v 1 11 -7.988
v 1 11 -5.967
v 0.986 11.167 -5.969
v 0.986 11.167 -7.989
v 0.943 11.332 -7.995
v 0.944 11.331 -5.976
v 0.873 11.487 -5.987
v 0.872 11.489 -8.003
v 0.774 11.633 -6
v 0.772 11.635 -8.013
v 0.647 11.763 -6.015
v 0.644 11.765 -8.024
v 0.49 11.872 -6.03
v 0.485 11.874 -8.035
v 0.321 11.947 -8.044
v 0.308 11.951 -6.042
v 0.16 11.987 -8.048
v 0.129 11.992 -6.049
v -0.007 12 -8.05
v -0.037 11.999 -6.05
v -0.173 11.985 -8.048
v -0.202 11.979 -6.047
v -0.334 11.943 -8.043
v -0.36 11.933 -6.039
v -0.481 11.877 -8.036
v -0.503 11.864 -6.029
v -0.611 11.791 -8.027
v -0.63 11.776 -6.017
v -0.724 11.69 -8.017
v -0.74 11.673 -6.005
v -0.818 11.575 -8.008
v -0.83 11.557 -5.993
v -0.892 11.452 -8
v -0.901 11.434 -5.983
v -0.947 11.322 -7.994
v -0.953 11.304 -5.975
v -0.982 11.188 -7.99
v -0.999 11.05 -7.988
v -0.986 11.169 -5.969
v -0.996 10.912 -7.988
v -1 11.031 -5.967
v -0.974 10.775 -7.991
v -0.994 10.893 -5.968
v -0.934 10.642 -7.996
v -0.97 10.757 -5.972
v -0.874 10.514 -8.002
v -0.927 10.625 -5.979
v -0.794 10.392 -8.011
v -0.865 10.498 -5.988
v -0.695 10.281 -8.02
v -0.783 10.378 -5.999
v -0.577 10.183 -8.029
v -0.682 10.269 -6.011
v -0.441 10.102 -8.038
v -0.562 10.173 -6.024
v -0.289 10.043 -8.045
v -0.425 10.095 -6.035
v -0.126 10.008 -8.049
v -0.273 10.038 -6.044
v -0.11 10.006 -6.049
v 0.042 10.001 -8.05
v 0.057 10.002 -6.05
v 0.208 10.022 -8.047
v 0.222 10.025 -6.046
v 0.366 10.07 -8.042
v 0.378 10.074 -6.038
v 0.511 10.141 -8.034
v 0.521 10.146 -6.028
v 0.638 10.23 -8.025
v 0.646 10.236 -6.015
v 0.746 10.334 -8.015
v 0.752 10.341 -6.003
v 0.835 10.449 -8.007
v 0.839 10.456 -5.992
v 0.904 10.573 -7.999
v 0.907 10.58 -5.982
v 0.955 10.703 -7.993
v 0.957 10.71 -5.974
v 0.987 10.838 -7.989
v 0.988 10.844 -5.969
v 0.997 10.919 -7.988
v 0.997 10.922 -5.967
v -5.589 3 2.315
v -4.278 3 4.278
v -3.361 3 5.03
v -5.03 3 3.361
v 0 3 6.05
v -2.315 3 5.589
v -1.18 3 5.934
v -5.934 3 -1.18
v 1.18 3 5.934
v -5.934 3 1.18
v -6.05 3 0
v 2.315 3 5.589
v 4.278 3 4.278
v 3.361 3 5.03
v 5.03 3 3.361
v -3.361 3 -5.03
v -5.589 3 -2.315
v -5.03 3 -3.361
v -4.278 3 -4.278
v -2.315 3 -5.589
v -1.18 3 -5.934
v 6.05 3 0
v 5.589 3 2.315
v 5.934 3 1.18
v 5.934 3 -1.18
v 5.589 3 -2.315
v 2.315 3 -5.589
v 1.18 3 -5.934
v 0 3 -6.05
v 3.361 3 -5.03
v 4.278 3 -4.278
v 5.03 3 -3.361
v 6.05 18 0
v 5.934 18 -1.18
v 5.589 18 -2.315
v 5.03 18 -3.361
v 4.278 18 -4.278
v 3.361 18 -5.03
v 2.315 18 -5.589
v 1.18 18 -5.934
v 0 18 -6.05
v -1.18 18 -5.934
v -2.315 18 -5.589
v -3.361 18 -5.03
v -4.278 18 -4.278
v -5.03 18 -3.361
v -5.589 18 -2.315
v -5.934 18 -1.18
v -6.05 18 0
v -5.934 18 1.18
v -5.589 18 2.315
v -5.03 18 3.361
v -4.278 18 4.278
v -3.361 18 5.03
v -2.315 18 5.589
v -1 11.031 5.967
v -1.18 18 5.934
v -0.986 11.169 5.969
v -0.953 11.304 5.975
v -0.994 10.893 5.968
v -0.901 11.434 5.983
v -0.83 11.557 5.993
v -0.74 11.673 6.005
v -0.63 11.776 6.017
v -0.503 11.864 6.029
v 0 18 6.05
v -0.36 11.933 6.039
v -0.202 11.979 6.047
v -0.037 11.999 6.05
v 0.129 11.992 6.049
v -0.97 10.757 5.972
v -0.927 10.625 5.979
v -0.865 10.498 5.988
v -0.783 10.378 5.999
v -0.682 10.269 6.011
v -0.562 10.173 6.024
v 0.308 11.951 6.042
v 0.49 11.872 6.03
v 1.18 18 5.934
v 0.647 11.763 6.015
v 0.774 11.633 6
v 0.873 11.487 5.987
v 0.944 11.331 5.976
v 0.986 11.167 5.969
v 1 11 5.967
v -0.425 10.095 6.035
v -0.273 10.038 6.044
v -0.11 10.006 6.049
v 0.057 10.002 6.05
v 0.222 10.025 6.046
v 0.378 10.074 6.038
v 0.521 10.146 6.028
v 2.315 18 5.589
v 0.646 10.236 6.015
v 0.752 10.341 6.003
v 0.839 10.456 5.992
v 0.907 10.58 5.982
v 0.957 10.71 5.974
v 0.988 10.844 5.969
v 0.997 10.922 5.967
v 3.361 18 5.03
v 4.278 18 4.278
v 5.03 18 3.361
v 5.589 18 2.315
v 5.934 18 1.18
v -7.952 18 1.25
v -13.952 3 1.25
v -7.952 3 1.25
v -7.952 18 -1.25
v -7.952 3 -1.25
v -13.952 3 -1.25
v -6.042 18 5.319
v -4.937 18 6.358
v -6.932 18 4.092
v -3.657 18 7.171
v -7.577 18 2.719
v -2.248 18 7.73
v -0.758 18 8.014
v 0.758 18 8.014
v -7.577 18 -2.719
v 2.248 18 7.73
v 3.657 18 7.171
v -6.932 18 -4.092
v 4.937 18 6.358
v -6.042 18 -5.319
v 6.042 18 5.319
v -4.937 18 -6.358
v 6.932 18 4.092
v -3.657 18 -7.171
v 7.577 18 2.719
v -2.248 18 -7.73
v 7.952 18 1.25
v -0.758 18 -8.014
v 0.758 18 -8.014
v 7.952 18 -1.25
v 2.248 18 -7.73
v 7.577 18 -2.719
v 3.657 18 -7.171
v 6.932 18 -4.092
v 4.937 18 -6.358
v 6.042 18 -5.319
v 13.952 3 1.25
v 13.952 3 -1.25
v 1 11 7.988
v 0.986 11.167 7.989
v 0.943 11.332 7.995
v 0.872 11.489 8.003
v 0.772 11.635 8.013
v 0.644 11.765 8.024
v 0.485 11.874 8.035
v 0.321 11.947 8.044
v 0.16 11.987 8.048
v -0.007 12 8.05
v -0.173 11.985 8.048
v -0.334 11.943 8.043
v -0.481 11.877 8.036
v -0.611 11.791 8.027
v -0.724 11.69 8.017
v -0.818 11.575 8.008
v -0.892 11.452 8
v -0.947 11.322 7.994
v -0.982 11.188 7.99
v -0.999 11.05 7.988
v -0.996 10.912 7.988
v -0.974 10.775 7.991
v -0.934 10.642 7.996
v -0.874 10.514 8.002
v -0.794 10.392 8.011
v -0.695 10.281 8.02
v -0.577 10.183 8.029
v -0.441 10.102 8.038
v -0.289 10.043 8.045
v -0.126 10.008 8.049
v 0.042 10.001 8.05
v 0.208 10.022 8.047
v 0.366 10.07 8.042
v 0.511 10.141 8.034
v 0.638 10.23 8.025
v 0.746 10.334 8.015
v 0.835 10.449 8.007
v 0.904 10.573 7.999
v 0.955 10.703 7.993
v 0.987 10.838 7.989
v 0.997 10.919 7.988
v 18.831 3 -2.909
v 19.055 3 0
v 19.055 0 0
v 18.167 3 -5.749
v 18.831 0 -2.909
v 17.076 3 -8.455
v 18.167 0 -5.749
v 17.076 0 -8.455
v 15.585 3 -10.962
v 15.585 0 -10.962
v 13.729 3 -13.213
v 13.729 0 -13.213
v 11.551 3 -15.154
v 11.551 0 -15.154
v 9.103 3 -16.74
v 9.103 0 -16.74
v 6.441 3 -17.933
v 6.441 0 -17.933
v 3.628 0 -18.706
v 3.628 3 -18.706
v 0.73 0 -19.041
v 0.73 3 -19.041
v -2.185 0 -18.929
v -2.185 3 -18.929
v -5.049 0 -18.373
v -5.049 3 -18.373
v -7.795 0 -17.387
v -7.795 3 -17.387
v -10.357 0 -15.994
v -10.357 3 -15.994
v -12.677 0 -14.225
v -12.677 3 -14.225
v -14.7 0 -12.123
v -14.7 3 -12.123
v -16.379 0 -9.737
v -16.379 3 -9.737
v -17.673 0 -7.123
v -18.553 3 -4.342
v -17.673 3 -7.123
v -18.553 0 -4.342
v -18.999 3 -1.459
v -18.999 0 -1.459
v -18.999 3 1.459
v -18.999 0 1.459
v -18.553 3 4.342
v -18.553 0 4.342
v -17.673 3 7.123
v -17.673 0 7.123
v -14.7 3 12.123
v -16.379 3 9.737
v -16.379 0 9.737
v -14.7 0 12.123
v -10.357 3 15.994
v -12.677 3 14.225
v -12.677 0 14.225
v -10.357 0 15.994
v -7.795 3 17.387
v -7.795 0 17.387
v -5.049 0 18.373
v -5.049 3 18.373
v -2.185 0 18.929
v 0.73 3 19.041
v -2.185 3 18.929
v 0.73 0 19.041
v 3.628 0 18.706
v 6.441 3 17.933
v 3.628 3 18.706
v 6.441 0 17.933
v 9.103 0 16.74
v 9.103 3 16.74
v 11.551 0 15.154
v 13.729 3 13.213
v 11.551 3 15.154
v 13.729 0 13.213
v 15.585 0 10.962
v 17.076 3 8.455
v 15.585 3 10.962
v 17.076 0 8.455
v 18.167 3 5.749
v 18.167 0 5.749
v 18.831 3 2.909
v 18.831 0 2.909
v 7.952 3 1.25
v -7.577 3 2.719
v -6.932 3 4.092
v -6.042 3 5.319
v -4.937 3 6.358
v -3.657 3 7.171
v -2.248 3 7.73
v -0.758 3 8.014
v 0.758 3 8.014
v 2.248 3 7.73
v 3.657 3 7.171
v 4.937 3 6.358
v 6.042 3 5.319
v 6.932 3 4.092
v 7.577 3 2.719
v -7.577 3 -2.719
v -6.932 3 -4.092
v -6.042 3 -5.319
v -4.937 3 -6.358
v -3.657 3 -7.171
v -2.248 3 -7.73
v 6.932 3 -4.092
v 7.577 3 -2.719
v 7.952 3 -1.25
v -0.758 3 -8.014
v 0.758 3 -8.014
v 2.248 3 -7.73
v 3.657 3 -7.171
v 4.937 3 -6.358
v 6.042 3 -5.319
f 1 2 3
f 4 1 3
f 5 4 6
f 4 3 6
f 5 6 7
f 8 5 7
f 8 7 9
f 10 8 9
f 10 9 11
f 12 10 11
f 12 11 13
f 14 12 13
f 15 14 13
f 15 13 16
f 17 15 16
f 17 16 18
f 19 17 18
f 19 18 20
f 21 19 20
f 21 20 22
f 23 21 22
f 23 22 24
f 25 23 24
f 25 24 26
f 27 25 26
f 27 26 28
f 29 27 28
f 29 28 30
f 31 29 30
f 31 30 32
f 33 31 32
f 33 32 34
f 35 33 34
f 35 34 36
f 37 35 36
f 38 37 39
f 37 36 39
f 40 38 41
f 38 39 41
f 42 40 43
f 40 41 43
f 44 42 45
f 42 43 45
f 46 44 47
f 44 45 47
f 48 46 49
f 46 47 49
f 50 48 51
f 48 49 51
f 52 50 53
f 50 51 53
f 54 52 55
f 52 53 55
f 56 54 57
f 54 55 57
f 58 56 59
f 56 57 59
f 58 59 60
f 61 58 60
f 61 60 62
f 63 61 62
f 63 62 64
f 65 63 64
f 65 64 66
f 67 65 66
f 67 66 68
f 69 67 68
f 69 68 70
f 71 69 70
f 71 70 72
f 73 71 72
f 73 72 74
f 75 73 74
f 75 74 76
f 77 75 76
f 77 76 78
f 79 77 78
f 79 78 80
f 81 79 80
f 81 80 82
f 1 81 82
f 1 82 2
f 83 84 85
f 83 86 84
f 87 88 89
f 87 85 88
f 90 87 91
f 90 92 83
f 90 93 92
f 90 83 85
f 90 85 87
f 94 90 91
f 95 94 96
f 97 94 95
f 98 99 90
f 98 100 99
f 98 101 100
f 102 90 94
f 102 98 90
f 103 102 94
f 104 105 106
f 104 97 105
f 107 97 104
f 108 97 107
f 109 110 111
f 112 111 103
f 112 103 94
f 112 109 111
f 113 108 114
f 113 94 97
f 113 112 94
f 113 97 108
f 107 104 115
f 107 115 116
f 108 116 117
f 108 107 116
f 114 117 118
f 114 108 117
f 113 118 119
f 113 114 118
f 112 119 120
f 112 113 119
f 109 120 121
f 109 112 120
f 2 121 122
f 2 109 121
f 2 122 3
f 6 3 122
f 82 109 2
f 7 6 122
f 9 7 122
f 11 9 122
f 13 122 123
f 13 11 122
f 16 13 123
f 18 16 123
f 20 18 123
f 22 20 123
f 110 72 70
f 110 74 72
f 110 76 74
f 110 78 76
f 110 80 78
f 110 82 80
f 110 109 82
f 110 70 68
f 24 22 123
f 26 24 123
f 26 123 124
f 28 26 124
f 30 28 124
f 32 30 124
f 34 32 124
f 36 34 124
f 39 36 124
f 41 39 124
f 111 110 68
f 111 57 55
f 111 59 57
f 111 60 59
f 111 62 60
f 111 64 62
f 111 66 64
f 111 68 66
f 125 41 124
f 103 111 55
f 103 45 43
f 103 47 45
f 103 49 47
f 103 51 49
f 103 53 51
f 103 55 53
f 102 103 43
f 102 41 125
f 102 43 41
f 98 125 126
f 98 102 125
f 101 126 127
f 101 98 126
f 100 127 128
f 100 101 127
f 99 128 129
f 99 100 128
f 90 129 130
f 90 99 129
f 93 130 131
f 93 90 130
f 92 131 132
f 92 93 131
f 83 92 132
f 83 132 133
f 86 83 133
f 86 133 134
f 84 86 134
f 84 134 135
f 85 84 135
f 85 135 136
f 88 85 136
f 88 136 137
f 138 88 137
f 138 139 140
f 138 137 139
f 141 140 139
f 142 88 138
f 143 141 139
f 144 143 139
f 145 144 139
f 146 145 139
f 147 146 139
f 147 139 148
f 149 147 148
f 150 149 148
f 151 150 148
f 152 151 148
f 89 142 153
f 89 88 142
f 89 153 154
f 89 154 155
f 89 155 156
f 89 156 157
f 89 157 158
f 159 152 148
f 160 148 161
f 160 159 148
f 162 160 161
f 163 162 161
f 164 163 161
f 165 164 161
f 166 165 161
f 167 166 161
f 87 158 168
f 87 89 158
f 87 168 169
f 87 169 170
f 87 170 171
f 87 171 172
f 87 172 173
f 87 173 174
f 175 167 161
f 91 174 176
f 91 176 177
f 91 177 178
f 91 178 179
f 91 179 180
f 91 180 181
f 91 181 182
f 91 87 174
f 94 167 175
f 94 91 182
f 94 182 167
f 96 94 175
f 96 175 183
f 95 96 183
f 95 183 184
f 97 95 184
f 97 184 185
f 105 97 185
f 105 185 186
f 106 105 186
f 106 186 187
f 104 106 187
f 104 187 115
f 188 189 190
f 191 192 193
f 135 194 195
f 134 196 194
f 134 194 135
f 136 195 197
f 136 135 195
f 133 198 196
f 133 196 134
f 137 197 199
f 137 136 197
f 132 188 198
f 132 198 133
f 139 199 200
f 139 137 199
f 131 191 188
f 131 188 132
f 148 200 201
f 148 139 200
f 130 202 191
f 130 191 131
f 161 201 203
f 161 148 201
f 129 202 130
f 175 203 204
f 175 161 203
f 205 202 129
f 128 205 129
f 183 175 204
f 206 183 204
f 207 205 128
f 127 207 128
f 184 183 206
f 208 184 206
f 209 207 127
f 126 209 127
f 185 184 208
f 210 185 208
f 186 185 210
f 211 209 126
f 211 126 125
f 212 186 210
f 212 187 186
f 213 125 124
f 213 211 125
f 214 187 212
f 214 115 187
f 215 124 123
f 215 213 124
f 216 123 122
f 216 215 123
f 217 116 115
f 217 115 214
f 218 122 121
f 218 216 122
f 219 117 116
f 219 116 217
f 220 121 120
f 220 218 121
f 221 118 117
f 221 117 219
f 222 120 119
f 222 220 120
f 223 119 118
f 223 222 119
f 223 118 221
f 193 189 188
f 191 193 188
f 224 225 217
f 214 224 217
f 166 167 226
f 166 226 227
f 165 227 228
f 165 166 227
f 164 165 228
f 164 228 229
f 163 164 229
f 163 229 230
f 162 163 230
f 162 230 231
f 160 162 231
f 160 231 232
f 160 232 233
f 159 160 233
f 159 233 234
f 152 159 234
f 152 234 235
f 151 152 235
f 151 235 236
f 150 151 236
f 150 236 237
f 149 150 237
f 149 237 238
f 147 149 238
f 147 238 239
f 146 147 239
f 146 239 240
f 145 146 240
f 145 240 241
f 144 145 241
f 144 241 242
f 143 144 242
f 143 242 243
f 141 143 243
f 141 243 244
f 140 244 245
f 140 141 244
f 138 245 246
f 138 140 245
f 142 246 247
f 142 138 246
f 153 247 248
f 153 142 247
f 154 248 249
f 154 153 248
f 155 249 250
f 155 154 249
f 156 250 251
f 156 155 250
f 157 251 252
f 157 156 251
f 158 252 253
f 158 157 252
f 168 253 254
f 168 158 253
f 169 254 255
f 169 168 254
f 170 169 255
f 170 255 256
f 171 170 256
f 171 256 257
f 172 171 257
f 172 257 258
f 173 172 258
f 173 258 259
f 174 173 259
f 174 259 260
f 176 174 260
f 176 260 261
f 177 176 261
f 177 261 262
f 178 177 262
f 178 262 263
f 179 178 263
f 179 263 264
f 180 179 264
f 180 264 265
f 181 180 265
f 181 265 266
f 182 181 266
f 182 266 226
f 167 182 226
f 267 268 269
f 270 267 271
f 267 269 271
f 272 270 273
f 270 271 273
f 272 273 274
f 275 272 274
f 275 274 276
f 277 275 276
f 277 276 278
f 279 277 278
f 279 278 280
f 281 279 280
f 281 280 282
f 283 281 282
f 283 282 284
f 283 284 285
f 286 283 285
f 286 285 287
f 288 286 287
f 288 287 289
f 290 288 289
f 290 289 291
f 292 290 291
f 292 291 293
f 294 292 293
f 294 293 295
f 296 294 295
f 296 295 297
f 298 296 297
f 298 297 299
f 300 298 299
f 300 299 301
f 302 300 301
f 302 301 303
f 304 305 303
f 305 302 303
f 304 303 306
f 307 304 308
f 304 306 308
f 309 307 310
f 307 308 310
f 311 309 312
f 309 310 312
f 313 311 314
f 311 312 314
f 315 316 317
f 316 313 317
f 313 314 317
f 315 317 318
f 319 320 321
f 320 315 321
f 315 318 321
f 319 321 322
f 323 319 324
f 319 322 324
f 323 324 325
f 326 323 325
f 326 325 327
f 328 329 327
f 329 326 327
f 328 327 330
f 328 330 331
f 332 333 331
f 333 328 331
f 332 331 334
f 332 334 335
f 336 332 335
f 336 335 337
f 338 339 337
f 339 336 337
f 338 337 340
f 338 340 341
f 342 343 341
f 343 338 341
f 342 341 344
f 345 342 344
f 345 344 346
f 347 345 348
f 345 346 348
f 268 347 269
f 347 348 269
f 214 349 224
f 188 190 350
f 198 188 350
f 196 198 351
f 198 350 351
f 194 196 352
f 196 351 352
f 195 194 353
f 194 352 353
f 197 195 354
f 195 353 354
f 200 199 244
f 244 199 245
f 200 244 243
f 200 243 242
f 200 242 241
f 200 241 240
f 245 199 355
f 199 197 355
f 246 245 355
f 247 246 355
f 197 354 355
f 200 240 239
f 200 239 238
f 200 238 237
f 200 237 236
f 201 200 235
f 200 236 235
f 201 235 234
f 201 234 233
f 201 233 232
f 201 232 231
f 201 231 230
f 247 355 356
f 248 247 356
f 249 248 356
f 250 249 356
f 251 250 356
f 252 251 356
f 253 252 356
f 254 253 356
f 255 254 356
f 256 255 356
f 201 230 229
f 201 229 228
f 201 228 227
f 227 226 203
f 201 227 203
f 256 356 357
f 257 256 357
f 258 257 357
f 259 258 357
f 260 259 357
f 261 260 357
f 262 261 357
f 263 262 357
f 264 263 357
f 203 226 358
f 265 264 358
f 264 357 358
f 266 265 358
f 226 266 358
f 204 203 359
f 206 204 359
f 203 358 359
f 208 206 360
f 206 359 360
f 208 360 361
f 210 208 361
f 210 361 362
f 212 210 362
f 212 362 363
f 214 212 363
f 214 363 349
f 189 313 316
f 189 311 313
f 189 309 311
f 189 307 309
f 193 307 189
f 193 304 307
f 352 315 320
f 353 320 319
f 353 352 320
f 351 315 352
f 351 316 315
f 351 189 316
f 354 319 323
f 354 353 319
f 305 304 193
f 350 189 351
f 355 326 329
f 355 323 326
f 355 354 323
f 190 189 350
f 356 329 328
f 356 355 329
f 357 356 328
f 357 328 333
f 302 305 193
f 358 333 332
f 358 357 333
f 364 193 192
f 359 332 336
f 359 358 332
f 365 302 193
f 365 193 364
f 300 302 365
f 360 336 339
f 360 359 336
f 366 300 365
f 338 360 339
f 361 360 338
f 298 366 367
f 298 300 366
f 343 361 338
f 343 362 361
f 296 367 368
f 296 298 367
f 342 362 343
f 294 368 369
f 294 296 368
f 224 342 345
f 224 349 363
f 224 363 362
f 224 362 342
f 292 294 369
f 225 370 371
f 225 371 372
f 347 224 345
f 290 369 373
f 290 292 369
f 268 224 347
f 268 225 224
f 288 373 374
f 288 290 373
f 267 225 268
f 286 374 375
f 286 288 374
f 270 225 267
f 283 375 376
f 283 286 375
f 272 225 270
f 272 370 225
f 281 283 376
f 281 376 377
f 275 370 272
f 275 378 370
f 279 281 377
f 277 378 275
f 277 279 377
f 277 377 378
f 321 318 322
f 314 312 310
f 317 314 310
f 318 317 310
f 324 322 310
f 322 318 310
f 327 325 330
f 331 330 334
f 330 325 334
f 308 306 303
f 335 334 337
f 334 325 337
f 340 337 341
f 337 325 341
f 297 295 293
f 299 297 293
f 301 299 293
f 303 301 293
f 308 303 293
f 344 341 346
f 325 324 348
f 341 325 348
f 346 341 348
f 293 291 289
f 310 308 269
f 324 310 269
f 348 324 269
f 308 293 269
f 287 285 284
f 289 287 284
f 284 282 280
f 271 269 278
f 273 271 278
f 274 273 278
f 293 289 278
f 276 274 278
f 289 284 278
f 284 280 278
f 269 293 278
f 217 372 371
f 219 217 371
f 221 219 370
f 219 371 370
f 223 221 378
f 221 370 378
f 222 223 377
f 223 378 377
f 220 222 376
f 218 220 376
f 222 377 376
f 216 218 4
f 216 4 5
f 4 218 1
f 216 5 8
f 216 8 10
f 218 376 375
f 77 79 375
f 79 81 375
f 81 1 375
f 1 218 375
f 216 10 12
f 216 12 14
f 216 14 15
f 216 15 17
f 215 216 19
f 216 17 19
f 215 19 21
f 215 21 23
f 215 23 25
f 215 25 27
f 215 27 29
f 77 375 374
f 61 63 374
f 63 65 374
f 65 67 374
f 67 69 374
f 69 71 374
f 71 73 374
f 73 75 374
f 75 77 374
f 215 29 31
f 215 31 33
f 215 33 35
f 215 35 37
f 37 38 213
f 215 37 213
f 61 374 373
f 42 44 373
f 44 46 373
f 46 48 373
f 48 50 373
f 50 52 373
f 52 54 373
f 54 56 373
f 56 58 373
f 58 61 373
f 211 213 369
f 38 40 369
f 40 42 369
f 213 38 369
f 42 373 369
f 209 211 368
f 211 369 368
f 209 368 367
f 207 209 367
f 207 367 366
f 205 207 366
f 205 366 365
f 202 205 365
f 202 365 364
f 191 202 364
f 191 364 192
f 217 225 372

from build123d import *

# Parameters (mm, degrees)
IZIM1_R                      = 19.054564863
Y_KSEKLIK_EKSTR_ZYON1_DEPTH  = 3
IZIM1_3_R                    = 8.05
IZIM1_3_R_2                  = 6.05
Y_KSEKLIK_EKSTR_ZYON2_DEPTH  = 18
Y_KSEKLIK_EKSTR_ZYON10_DEPTH = 18
KES_EKSTR_ZYON1_DEPTH        = 20.054564863
KES_EKSTR_ZYON1_DEPTH_BACK   = 20.054564863
IZIM6_R                      = 1
KES_EKSTR_ZYON2_DEPTH        = 20.054564863
KES_EKSTR_ZYON2_DEPTH_BACK   = 20.054564863


with BuildPart() as part:
    # Çizim1 → Yükseklik-Ekstrüzyon1 (new body)
    with BuildSketch(Plane(origin=(0, 0, 0), x_dir=(1, 0, 0), z_dir=(0, 1, 0))):
        Circle(IZIM1_R)
    extrude(amount=Y_KSEKLIK_EKSTR_ZYON1_DEPTH)

    # Çizim1<3> → Yükseklik-Ekstrüzyon2 (add)
    with BuildSketch(Plane(origin=(0, 0, 0), x_dir=(1, 0, 0), z_dir=(0, 1, 0))):
        Circle(IZIM1_3_R)
        Circle(IZIM1_3_R_2, mode=Mode.SUBTRACT)
    extrude(amount=Y_KSEKLIK_EKSTR_ZYON2_DEPTH)

    # Çizim1<11> → Yükseklik-Ekstrüzyon10 (add)
    with BuildSketch(Plane(origin=(0, 0, 0), x_dir=(1, 0, 0), z_dir=(0, 1, 0))):
        with BuildLine():
            ThreePointArc((-7.952358141, -1.25), (-8.05, 0), (-7.952358141, 1.25))
            Line((-7.952358141, 1.25), (-13.952358141, 1.25))
            Line((-13.952358141, 1.25), (-13.952358141, -1.25))
            Line((-13.952358141, -1.25), (-7.952358141, -1.25))
        make_face()
        with BuildLine():
            Line((13.952358141, 1.25), (7.952358141, 1.25))
            ThreePointArc((7.952358141, 1.25), (8.025552412, 0.626903887), (8.05, 0))
            ThreePointArc((8.05, 0), (8.025552412, -0.626903887), (7.952358141, -1.25))
            Line((7.952358141, -1.25), (13.952358141, -1.25))
            Line((13.952358141, -1.25), (13.952358141, 1.25))
        make_face()
    extrude(amount=Y_KSEKLIK_EKSTR_ZYON10_DEPTH)

    # Çizim5 → Kes-Ekstrüzyon1 (cut, two sides)
    with BuildSketch(Plane.XY) as kes_ekstr_zyon1_sk:
        Polygon((-13.952358141, 3), (-7.952358141, 18), (-13.952358141, 18), align=None)
        Polygon((7.952358141, 18), (13.952358141, 18), (13.952358141, 3), align=None)
    extrude(amount=KES_EKSTR_ZYON1_DEPTH, mode=Mode.SUBTRACT)
    extrude(kes_ekstr_zyon1_sk.sketch, amount=-KES_EKSTR_ZYON1_DEPTH_BACK, mode=Mode.SUBTRACT)

    # Çizim6 → Kes-Ekstrüzyon2 (cut, two sides)
    with BuildSketch(Plane.XY) as kes_ekstr_zyon2_sk:
        with Locations((0, 11)):
            Circle(IZIM6_R)
    extrude(amount=KES_EKSTR_ZYON2_DEPTH, mode=Mode.SUBTRACT)
    extrude(kes_ekstr_zyon2_sk.sketch, amount=-KES_EKSTR_ZYON2_DEPTH_BACK, mode=Mode.SUBTRACT)


solid = part.part
